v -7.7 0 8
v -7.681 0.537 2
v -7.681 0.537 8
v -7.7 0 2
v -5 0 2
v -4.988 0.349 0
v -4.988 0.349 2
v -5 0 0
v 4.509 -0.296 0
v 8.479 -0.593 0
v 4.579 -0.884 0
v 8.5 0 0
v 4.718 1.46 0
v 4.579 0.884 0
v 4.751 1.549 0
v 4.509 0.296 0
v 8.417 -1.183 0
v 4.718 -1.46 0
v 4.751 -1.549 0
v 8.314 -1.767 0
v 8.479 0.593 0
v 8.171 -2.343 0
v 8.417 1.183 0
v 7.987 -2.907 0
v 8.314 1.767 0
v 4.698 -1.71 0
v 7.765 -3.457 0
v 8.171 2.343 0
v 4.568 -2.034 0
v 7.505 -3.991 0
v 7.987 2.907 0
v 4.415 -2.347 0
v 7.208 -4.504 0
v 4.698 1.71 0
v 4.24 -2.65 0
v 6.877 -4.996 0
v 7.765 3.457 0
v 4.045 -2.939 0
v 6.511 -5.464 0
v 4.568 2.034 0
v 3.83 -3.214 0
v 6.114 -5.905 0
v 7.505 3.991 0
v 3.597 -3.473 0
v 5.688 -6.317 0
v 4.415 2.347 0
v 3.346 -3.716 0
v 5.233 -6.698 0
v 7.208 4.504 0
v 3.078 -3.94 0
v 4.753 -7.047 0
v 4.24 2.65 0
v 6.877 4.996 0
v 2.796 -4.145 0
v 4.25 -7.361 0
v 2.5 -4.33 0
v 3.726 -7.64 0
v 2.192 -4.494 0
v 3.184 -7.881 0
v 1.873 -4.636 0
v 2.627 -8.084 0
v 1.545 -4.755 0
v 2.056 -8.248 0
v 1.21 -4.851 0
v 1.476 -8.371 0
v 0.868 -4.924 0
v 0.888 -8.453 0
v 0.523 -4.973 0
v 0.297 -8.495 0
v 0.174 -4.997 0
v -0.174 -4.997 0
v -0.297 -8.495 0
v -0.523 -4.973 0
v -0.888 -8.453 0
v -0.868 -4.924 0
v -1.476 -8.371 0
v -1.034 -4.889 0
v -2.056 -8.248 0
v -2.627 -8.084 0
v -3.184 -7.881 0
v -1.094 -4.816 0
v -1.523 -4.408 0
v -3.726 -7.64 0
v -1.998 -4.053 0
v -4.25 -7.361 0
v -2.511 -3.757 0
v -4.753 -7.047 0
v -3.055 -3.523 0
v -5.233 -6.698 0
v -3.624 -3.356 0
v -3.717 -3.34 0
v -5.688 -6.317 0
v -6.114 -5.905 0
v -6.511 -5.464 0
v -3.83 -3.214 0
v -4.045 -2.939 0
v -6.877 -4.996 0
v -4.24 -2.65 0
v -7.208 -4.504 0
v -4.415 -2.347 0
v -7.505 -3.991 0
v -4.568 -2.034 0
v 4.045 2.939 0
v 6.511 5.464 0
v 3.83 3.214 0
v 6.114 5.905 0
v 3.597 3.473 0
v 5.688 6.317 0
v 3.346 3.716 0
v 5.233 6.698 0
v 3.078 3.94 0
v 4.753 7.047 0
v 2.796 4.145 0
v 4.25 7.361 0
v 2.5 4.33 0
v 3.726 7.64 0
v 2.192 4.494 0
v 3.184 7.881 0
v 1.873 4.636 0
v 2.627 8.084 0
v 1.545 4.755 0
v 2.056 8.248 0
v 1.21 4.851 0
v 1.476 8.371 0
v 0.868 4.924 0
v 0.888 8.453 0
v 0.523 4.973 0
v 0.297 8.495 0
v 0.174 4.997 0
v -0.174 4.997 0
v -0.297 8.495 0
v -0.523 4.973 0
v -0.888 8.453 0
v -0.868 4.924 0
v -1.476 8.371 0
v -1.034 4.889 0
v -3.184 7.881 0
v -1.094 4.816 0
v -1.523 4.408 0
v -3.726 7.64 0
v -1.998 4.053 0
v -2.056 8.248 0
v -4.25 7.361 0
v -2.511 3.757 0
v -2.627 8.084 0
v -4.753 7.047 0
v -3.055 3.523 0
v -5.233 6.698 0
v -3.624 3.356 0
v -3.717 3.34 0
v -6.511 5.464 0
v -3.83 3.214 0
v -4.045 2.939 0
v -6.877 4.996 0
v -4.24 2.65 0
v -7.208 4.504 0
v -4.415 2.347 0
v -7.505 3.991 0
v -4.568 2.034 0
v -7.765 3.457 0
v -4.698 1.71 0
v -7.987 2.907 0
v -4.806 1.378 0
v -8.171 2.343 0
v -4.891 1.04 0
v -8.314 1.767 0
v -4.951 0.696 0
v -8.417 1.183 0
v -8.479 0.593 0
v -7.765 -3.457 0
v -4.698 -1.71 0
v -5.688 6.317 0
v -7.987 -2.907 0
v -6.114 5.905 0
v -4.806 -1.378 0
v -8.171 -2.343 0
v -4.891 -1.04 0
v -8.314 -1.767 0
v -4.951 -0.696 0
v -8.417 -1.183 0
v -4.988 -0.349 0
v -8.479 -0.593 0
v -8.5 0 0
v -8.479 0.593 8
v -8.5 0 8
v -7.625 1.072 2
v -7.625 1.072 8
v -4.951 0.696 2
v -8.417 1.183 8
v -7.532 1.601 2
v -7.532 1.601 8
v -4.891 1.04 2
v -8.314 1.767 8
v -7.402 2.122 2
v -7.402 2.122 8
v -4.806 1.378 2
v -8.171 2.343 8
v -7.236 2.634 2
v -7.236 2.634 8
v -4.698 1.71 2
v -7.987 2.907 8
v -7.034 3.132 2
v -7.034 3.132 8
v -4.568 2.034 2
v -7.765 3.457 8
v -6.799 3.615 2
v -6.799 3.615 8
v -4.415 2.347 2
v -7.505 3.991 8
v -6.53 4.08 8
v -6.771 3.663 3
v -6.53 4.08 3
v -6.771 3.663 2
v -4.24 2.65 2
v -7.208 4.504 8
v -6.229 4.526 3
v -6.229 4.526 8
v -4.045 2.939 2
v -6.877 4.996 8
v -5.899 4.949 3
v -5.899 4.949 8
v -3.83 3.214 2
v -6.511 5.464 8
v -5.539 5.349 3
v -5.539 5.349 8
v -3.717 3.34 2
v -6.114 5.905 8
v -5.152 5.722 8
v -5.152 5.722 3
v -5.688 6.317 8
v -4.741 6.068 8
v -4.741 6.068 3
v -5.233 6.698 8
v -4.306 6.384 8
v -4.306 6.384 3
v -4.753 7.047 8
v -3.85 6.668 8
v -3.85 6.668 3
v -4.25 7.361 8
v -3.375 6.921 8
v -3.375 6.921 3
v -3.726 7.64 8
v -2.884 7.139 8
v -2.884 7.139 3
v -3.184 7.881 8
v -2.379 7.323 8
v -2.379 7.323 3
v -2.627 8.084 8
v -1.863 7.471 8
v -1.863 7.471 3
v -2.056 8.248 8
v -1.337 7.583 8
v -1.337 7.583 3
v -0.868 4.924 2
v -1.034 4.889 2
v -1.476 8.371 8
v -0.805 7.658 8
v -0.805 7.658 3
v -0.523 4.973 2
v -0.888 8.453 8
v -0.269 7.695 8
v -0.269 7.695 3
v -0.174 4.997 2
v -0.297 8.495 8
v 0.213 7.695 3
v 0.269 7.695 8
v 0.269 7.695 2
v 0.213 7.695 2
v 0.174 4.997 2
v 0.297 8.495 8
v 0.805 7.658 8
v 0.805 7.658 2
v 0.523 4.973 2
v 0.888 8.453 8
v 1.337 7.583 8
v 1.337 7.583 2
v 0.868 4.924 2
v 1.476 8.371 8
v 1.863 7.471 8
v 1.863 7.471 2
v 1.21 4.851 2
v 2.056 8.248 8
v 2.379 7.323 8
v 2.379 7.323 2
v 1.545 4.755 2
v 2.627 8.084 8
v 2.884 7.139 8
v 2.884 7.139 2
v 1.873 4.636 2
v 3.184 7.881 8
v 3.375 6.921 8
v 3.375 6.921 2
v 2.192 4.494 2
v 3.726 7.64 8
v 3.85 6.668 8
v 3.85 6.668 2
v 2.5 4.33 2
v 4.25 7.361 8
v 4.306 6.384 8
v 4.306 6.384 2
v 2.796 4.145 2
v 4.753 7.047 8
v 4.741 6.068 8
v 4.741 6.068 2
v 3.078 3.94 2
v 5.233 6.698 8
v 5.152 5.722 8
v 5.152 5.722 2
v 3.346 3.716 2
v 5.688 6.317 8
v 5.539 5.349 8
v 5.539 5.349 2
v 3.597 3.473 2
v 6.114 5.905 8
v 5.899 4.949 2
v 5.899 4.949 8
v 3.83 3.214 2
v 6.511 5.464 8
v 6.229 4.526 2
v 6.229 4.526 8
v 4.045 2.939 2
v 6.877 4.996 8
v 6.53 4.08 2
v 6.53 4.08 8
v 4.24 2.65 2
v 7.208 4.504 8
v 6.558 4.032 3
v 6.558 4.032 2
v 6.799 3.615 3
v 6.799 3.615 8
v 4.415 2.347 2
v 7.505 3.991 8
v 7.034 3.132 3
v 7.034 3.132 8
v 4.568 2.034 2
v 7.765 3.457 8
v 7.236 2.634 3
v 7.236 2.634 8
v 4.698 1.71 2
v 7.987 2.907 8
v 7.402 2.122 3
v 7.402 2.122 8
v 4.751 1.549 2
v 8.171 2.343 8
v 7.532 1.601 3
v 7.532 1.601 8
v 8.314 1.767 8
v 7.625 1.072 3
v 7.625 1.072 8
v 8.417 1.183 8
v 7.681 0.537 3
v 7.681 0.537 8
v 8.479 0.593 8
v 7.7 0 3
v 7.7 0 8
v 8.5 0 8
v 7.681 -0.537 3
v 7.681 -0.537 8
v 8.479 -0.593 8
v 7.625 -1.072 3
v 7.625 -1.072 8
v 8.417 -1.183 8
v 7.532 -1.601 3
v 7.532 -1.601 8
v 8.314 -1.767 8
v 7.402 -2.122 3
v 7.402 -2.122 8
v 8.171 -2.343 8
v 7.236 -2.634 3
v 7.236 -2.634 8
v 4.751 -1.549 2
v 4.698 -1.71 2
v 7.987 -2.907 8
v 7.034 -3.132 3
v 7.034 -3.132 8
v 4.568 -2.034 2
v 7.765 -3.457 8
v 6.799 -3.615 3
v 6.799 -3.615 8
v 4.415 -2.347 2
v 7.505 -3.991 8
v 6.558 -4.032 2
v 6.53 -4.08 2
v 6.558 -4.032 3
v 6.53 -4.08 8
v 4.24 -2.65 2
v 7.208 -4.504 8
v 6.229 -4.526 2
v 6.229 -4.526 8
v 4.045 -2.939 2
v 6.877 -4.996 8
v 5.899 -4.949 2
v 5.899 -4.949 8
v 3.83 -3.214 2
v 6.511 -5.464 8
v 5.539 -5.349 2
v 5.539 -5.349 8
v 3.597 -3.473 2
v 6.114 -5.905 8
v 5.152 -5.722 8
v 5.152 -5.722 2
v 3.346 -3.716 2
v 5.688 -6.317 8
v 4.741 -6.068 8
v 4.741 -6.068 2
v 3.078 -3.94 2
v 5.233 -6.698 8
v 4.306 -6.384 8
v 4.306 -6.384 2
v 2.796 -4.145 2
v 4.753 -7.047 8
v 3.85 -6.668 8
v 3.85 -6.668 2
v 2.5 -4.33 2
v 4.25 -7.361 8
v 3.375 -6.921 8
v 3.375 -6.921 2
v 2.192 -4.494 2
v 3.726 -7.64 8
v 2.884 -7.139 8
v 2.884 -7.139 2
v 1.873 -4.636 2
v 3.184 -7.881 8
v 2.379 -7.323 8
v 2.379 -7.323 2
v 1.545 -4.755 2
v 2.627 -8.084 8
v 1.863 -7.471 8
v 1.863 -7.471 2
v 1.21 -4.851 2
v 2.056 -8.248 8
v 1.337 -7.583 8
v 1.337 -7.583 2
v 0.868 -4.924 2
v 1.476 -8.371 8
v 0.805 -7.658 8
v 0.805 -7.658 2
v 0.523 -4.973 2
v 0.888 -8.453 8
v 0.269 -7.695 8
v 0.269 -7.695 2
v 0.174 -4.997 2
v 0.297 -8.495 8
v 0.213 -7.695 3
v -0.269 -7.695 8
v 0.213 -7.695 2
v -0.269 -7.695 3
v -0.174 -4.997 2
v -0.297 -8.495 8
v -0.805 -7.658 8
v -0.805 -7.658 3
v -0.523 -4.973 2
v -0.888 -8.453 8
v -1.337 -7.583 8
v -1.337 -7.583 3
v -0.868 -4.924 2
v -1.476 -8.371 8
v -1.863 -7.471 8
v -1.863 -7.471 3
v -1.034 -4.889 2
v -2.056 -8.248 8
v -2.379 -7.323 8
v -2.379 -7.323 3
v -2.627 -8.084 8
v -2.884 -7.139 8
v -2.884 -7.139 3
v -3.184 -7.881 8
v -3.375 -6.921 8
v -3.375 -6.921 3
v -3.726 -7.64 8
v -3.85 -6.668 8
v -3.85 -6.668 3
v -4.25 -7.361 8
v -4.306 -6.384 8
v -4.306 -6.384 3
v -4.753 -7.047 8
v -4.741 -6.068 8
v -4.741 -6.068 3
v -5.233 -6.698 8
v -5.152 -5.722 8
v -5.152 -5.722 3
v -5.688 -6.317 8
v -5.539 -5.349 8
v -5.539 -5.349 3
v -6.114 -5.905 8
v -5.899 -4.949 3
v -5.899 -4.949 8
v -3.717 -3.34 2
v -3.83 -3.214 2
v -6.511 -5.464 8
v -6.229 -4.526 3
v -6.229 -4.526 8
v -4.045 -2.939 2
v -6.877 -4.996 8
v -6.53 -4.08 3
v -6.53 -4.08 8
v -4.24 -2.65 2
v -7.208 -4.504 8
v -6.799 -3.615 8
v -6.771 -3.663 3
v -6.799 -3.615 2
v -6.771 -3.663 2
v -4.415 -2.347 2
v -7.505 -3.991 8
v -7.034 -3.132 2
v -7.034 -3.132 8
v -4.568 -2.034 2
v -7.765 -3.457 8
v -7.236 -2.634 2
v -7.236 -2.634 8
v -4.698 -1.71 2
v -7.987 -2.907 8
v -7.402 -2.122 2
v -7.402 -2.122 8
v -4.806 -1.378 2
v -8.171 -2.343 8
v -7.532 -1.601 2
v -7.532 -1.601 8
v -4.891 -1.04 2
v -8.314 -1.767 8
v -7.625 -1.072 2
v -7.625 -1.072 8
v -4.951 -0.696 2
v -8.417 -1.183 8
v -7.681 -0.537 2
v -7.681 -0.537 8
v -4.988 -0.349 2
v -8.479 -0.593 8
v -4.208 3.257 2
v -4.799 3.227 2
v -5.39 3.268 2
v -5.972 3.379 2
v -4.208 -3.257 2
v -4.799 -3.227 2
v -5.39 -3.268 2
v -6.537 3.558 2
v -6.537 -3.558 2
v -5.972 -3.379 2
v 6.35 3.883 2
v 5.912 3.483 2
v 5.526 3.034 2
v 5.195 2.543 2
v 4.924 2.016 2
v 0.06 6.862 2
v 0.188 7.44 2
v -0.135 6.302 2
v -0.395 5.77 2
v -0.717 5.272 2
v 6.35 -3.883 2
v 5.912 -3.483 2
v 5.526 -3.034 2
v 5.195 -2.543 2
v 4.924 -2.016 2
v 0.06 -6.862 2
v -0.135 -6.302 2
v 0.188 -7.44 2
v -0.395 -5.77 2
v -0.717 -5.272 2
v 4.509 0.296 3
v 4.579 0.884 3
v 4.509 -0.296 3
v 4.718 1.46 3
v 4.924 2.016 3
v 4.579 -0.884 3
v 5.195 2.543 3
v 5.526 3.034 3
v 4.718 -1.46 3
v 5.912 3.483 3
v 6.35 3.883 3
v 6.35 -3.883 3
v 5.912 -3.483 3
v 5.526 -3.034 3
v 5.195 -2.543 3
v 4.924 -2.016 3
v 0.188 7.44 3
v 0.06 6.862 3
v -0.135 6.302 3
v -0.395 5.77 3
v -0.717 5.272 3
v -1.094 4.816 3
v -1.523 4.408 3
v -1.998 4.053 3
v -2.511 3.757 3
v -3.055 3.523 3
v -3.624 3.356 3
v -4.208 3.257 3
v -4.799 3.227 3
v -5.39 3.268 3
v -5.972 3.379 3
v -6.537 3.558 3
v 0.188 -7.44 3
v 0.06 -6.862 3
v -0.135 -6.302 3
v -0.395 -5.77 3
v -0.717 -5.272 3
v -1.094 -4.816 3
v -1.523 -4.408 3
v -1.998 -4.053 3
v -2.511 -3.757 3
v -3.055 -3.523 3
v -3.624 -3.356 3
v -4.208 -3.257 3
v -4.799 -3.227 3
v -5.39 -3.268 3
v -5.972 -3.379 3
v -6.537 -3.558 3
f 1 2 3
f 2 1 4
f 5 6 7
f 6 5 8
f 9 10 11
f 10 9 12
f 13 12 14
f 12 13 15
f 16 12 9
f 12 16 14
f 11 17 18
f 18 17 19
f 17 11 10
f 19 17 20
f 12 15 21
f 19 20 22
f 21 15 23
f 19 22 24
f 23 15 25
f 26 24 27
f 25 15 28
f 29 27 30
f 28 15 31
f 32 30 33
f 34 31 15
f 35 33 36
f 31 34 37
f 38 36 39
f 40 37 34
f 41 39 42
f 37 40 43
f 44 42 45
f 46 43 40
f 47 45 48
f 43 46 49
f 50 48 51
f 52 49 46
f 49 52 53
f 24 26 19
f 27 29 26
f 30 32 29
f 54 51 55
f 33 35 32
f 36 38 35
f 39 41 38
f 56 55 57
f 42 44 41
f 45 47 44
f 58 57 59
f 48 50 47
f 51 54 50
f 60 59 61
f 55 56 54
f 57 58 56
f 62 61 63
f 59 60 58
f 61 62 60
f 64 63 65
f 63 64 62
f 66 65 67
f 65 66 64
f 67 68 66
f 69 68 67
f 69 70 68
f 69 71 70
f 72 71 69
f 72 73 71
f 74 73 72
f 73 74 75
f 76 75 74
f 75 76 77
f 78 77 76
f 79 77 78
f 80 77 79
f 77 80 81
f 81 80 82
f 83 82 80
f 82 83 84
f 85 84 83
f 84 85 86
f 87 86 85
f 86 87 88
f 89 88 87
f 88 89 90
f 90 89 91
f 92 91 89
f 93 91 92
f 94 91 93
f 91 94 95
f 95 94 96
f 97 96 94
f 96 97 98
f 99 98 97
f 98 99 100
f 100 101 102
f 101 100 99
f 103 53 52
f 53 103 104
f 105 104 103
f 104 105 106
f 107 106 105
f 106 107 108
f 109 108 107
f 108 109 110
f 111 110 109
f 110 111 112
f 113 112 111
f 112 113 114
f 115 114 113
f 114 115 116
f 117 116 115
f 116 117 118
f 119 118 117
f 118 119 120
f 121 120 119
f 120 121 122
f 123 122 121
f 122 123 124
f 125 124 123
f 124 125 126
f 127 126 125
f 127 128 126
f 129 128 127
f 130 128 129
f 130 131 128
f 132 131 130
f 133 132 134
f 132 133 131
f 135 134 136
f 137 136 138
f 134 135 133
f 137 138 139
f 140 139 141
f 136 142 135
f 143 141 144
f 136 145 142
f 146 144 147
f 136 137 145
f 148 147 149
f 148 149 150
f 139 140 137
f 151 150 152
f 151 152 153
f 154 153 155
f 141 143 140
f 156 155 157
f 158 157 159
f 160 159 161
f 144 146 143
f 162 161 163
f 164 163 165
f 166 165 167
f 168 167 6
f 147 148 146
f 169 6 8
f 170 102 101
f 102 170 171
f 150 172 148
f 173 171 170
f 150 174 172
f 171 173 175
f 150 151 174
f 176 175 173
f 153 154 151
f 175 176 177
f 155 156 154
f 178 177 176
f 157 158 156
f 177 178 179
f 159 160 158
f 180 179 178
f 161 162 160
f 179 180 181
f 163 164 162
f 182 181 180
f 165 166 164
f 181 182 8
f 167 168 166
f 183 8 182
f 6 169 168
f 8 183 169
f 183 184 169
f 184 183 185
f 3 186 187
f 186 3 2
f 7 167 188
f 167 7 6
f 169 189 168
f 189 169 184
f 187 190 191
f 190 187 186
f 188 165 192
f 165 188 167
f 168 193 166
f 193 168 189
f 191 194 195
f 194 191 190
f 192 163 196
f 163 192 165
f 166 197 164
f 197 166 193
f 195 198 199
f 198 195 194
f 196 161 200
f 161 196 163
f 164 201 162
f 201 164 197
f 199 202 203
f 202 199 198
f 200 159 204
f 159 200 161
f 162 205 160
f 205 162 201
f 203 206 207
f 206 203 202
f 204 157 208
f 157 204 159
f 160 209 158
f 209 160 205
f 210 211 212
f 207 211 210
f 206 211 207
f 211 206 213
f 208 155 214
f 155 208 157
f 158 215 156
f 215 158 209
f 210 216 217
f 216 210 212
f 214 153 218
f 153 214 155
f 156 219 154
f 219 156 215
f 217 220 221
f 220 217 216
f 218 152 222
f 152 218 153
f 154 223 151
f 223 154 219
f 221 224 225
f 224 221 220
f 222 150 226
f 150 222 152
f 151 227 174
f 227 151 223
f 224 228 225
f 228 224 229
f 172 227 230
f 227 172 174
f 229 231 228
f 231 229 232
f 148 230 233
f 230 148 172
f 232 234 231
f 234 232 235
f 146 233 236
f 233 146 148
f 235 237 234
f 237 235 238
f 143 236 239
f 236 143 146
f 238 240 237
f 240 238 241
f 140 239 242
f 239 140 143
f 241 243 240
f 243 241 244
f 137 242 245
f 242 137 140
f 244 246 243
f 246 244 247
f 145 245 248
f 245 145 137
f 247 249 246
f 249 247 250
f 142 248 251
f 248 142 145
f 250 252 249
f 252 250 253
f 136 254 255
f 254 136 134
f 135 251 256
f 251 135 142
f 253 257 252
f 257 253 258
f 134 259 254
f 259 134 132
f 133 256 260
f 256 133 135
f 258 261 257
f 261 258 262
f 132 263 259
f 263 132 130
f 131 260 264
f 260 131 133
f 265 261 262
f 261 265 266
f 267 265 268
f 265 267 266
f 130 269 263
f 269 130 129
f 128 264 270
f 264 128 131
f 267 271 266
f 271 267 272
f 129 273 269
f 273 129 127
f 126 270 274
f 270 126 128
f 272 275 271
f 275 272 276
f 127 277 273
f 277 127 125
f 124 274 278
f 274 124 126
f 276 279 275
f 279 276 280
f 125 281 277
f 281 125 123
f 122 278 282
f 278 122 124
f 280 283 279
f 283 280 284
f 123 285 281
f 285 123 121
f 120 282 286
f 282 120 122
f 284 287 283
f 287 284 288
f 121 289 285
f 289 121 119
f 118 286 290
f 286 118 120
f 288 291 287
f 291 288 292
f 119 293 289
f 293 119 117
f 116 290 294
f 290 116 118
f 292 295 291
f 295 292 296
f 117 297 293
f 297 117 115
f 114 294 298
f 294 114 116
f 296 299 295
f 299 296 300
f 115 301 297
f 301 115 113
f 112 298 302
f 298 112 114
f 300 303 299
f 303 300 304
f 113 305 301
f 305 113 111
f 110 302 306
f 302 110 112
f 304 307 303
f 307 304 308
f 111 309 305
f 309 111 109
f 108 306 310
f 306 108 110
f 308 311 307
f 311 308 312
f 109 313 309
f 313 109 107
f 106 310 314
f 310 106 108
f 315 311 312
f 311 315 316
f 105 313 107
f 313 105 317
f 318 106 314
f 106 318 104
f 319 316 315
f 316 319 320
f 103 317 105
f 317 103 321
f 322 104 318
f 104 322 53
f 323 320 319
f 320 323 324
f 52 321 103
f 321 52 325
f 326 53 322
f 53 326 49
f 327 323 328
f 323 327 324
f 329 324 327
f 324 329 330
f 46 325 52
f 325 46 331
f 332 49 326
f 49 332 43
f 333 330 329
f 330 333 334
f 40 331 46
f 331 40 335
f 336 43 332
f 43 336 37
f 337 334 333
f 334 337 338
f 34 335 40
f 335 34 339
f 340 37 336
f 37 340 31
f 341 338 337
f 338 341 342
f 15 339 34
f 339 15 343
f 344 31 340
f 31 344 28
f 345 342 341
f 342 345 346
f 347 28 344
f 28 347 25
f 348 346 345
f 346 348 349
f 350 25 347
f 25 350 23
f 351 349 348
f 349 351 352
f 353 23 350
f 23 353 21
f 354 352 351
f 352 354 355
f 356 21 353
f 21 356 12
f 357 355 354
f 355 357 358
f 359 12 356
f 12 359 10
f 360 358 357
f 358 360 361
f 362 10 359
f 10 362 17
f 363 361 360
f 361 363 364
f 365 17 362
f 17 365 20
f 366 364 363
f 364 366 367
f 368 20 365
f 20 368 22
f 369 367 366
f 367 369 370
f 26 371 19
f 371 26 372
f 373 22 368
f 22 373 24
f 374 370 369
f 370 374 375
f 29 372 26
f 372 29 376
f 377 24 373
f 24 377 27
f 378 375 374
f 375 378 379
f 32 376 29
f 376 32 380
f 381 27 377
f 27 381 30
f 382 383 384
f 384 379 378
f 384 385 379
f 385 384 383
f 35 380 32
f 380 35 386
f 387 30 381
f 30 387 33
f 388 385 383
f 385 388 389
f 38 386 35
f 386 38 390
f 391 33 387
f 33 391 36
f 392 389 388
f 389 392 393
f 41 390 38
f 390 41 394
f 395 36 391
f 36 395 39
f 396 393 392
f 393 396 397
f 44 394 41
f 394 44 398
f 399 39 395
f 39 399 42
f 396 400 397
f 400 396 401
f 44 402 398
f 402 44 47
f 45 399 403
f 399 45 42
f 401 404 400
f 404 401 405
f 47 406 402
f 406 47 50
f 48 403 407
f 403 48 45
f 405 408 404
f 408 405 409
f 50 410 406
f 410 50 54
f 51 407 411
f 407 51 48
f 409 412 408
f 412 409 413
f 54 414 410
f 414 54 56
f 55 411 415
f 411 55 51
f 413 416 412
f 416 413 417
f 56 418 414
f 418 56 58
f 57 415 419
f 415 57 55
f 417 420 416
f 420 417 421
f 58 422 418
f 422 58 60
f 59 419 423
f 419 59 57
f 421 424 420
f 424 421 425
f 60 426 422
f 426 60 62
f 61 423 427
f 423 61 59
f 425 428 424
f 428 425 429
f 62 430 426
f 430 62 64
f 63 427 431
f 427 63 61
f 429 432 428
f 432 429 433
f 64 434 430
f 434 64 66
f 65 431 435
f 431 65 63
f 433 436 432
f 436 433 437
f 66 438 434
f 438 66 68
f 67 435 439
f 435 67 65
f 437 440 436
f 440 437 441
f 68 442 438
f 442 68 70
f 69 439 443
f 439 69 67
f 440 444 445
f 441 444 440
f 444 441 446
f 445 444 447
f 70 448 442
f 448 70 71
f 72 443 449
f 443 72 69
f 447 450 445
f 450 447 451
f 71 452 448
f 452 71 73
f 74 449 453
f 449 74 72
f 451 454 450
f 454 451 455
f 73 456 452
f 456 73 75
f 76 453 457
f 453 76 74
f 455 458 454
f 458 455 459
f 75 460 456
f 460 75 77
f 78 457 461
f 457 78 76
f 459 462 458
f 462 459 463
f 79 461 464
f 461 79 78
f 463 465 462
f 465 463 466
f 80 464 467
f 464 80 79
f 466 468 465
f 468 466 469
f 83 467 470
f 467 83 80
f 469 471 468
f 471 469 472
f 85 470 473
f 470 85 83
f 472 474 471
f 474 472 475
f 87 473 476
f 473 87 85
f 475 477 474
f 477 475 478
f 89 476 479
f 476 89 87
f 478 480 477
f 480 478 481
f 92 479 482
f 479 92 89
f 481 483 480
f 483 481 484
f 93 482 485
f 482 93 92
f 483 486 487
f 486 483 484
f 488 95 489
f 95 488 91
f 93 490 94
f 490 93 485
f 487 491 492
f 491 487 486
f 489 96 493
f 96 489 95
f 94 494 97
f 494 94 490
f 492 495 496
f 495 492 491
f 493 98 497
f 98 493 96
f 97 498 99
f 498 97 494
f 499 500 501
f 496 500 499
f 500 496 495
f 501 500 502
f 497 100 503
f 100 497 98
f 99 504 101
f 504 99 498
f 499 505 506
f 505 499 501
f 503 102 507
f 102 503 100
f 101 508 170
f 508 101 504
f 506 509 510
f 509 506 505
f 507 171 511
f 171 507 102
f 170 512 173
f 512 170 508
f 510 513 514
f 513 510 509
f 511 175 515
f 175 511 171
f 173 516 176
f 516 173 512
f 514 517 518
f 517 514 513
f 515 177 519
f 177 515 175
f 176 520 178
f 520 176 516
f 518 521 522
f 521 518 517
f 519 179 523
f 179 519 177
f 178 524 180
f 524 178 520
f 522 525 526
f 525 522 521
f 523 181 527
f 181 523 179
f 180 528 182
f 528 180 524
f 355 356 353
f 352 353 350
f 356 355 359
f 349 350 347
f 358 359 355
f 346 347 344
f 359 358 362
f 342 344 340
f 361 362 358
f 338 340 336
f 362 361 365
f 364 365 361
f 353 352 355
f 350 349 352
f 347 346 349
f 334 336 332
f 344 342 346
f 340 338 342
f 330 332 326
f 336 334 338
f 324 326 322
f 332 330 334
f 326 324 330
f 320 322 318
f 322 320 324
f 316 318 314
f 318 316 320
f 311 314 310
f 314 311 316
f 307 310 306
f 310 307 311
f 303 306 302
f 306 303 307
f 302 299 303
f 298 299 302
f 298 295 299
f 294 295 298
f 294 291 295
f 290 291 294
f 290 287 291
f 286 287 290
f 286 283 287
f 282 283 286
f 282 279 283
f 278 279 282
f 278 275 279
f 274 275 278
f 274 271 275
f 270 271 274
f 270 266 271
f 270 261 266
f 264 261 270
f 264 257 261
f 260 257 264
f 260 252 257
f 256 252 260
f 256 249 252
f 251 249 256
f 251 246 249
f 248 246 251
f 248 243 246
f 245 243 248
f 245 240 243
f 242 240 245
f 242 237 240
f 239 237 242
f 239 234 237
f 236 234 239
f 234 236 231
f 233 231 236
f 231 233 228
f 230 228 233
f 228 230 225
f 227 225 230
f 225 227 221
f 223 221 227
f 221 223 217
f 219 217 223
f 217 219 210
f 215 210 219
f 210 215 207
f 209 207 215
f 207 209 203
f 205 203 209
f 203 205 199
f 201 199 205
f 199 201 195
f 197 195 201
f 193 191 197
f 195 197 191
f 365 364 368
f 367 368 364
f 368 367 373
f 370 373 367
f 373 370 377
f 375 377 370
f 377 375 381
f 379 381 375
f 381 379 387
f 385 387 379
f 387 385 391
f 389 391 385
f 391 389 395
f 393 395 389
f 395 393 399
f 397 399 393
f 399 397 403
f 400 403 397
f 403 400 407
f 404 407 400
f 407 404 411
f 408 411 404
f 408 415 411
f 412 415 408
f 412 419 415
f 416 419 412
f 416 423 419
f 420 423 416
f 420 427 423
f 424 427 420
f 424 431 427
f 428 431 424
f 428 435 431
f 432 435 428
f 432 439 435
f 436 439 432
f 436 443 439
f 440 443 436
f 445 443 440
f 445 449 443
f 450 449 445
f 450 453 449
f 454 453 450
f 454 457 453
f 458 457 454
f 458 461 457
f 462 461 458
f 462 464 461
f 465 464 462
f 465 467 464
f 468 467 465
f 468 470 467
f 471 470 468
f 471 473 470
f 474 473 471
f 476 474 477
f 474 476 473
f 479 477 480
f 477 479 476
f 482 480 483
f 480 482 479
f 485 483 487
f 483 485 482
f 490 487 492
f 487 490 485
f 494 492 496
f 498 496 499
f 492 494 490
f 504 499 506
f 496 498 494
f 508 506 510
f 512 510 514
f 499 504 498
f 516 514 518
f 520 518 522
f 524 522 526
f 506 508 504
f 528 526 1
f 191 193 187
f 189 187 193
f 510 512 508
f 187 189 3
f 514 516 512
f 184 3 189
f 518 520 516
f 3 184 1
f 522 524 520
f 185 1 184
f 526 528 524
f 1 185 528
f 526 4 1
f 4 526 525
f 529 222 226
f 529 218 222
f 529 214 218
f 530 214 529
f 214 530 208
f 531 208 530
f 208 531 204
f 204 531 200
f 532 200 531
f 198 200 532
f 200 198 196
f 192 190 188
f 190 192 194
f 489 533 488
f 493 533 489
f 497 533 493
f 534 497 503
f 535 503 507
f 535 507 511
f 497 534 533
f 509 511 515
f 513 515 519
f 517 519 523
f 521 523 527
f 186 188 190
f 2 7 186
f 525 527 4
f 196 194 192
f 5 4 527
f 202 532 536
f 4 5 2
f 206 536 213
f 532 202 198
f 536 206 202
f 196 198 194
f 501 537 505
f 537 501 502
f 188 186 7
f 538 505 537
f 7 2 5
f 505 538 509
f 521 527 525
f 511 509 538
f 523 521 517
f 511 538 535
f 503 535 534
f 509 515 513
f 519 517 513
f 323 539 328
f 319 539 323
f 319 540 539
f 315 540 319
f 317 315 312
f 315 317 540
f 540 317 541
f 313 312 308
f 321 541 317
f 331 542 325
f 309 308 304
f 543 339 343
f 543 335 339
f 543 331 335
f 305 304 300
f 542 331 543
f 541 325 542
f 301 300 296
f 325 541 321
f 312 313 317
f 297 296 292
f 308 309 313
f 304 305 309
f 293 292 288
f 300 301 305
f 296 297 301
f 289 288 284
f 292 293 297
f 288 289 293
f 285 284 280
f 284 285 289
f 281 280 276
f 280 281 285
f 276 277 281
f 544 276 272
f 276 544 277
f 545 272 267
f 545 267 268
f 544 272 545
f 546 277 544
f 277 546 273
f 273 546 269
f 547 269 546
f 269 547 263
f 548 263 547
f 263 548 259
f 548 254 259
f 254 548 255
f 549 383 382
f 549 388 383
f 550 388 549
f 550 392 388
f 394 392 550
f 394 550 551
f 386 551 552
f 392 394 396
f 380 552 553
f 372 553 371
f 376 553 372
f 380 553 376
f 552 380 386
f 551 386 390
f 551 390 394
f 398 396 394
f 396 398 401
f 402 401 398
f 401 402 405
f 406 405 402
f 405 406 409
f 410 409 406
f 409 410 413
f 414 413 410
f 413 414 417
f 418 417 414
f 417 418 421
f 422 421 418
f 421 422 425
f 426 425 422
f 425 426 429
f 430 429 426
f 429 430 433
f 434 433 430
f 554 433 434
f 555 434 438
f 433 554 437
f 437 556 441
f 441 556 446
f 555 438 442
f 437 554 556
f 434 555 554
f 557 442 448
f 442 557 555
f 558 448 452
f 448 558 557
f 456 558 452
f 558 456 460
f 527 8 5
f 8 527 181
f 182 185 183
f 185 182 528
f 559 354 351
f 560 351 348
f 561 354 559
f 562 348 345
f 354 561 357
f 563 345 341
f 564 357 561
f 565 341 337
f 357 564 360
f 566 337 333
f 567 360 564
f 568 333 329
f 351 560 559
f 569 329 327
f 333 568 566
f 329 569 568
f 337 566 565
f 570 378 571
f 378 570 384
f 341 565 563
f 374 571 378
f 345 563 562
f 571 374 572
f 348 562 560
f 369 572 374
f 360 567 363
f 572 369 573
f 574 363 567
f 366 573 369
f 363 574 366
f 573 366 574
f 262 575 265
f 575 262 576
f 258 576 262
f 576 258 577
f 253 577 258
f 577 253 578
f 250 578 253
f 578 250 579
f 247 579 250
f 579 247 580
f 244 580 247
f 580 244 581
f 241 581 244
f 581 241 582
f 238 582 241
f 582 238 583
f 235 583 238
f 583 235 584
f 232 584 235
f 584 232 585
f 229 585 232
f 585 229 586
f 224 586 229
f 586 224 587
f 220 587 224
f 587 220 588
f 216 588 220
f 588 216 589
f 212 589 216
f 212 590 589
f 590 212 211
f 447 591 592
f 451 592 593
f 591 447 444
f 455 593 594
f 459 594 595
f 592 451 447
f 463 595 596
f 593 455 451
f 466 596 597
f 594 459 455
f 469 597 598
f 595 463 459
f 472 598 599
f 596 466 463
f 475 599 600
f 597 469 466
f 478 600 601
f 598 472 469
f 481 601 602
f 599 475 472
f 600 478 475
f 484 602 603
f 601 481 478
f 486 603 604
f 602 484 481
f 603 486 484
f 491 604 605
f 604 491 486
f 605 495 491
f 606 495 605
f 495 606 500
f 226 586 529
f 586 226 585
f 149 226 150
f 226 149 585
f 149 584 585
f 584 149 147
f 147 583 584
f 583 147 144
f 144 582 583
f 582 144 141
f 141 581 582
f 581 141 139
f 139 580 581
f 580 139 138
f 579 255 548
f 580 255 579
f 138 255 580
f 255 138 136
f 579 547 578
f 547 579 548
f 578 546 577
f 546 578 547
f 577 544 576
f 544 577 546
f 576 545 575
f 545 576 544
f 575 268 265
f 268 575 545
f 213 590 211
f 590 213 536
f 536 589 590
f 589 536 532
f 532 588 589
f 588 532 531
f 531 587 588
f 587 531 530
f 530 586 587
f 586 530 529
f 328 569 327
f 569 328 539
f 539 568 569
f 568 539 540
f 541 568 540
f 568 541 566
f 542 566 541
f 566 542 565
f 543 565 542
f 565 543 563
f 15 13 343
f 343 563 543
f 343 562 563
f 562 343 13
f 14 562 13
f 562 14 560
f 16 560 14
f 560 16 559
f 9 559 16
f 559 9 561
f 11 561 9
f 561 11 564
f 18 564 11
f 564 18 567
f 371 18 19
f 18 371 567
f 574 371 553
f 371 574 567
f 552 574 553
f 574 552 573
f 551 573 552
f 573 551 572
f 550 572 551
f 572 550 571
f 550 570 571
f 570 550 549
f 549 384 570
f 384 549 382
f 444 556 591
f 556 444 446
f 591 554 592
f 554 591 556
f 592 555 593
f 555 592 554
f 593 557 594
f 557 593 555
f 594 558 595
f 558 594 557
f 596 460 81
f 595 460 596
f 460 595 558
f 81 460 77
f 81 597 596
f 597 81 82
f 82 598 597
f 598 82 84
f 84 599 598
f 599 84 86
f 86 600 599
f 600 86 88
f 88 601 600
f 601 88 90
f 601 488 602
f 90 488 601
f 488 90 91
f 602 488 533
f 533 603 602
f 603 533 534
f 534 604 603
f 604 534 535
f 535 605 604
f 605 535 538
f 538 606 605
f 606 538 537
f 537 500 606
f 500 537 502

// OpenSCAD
// This document uses MILLIMETRES as a unit.

// Set $fs (smallest arc fragment) to lower value than default 2.0
$fs = 0.6; // millimetres
$fa = 4;

wheel_diameter = 17.0;
motor_diameter = 15.0;
centre_diameter = 10.0;
motor_can_height = 5.0; // Height of the main can
overall_height = 8.0; // Includes the top part.
top_thickness = 2.0;

// This is how much we add to the inner radius
// to compensate for 3d printer splodge, we need to change it for a
// diferent 3d printer, nozzle etc.
inner_splodge = 0.2;

module main()
{
    rotate_extrude() {
        difference() {
            // Main outer
            square([wheel_diameter/2, overall_height]);
            // Shaft cutout
            square([centre_diameter/2, overall_height + 5.0]);
            // motor can cutout
            //translate([0, (overall_height - motor_can_height)])
            //    square([motor_diameter/2, motor_can_height]);
            // inner
            translate([0, top_thickness])
                square([(motor_diameter/2) + inner_splodge, overall_height + 5.0]);
        }
    }
    linear_extrude(height=(overall_height - motor_can_height)) {
        intersection() {
            circle(r=(motor_diameter/2 + 0.5));
            for (n=[0:3]) {
                rotate([0,0,(n*120)]) {
                    translate([motor_diameter/2 + 2.0, 0])
                        circle(r=5.0);
                }
            }
        }
    }
}

main();
